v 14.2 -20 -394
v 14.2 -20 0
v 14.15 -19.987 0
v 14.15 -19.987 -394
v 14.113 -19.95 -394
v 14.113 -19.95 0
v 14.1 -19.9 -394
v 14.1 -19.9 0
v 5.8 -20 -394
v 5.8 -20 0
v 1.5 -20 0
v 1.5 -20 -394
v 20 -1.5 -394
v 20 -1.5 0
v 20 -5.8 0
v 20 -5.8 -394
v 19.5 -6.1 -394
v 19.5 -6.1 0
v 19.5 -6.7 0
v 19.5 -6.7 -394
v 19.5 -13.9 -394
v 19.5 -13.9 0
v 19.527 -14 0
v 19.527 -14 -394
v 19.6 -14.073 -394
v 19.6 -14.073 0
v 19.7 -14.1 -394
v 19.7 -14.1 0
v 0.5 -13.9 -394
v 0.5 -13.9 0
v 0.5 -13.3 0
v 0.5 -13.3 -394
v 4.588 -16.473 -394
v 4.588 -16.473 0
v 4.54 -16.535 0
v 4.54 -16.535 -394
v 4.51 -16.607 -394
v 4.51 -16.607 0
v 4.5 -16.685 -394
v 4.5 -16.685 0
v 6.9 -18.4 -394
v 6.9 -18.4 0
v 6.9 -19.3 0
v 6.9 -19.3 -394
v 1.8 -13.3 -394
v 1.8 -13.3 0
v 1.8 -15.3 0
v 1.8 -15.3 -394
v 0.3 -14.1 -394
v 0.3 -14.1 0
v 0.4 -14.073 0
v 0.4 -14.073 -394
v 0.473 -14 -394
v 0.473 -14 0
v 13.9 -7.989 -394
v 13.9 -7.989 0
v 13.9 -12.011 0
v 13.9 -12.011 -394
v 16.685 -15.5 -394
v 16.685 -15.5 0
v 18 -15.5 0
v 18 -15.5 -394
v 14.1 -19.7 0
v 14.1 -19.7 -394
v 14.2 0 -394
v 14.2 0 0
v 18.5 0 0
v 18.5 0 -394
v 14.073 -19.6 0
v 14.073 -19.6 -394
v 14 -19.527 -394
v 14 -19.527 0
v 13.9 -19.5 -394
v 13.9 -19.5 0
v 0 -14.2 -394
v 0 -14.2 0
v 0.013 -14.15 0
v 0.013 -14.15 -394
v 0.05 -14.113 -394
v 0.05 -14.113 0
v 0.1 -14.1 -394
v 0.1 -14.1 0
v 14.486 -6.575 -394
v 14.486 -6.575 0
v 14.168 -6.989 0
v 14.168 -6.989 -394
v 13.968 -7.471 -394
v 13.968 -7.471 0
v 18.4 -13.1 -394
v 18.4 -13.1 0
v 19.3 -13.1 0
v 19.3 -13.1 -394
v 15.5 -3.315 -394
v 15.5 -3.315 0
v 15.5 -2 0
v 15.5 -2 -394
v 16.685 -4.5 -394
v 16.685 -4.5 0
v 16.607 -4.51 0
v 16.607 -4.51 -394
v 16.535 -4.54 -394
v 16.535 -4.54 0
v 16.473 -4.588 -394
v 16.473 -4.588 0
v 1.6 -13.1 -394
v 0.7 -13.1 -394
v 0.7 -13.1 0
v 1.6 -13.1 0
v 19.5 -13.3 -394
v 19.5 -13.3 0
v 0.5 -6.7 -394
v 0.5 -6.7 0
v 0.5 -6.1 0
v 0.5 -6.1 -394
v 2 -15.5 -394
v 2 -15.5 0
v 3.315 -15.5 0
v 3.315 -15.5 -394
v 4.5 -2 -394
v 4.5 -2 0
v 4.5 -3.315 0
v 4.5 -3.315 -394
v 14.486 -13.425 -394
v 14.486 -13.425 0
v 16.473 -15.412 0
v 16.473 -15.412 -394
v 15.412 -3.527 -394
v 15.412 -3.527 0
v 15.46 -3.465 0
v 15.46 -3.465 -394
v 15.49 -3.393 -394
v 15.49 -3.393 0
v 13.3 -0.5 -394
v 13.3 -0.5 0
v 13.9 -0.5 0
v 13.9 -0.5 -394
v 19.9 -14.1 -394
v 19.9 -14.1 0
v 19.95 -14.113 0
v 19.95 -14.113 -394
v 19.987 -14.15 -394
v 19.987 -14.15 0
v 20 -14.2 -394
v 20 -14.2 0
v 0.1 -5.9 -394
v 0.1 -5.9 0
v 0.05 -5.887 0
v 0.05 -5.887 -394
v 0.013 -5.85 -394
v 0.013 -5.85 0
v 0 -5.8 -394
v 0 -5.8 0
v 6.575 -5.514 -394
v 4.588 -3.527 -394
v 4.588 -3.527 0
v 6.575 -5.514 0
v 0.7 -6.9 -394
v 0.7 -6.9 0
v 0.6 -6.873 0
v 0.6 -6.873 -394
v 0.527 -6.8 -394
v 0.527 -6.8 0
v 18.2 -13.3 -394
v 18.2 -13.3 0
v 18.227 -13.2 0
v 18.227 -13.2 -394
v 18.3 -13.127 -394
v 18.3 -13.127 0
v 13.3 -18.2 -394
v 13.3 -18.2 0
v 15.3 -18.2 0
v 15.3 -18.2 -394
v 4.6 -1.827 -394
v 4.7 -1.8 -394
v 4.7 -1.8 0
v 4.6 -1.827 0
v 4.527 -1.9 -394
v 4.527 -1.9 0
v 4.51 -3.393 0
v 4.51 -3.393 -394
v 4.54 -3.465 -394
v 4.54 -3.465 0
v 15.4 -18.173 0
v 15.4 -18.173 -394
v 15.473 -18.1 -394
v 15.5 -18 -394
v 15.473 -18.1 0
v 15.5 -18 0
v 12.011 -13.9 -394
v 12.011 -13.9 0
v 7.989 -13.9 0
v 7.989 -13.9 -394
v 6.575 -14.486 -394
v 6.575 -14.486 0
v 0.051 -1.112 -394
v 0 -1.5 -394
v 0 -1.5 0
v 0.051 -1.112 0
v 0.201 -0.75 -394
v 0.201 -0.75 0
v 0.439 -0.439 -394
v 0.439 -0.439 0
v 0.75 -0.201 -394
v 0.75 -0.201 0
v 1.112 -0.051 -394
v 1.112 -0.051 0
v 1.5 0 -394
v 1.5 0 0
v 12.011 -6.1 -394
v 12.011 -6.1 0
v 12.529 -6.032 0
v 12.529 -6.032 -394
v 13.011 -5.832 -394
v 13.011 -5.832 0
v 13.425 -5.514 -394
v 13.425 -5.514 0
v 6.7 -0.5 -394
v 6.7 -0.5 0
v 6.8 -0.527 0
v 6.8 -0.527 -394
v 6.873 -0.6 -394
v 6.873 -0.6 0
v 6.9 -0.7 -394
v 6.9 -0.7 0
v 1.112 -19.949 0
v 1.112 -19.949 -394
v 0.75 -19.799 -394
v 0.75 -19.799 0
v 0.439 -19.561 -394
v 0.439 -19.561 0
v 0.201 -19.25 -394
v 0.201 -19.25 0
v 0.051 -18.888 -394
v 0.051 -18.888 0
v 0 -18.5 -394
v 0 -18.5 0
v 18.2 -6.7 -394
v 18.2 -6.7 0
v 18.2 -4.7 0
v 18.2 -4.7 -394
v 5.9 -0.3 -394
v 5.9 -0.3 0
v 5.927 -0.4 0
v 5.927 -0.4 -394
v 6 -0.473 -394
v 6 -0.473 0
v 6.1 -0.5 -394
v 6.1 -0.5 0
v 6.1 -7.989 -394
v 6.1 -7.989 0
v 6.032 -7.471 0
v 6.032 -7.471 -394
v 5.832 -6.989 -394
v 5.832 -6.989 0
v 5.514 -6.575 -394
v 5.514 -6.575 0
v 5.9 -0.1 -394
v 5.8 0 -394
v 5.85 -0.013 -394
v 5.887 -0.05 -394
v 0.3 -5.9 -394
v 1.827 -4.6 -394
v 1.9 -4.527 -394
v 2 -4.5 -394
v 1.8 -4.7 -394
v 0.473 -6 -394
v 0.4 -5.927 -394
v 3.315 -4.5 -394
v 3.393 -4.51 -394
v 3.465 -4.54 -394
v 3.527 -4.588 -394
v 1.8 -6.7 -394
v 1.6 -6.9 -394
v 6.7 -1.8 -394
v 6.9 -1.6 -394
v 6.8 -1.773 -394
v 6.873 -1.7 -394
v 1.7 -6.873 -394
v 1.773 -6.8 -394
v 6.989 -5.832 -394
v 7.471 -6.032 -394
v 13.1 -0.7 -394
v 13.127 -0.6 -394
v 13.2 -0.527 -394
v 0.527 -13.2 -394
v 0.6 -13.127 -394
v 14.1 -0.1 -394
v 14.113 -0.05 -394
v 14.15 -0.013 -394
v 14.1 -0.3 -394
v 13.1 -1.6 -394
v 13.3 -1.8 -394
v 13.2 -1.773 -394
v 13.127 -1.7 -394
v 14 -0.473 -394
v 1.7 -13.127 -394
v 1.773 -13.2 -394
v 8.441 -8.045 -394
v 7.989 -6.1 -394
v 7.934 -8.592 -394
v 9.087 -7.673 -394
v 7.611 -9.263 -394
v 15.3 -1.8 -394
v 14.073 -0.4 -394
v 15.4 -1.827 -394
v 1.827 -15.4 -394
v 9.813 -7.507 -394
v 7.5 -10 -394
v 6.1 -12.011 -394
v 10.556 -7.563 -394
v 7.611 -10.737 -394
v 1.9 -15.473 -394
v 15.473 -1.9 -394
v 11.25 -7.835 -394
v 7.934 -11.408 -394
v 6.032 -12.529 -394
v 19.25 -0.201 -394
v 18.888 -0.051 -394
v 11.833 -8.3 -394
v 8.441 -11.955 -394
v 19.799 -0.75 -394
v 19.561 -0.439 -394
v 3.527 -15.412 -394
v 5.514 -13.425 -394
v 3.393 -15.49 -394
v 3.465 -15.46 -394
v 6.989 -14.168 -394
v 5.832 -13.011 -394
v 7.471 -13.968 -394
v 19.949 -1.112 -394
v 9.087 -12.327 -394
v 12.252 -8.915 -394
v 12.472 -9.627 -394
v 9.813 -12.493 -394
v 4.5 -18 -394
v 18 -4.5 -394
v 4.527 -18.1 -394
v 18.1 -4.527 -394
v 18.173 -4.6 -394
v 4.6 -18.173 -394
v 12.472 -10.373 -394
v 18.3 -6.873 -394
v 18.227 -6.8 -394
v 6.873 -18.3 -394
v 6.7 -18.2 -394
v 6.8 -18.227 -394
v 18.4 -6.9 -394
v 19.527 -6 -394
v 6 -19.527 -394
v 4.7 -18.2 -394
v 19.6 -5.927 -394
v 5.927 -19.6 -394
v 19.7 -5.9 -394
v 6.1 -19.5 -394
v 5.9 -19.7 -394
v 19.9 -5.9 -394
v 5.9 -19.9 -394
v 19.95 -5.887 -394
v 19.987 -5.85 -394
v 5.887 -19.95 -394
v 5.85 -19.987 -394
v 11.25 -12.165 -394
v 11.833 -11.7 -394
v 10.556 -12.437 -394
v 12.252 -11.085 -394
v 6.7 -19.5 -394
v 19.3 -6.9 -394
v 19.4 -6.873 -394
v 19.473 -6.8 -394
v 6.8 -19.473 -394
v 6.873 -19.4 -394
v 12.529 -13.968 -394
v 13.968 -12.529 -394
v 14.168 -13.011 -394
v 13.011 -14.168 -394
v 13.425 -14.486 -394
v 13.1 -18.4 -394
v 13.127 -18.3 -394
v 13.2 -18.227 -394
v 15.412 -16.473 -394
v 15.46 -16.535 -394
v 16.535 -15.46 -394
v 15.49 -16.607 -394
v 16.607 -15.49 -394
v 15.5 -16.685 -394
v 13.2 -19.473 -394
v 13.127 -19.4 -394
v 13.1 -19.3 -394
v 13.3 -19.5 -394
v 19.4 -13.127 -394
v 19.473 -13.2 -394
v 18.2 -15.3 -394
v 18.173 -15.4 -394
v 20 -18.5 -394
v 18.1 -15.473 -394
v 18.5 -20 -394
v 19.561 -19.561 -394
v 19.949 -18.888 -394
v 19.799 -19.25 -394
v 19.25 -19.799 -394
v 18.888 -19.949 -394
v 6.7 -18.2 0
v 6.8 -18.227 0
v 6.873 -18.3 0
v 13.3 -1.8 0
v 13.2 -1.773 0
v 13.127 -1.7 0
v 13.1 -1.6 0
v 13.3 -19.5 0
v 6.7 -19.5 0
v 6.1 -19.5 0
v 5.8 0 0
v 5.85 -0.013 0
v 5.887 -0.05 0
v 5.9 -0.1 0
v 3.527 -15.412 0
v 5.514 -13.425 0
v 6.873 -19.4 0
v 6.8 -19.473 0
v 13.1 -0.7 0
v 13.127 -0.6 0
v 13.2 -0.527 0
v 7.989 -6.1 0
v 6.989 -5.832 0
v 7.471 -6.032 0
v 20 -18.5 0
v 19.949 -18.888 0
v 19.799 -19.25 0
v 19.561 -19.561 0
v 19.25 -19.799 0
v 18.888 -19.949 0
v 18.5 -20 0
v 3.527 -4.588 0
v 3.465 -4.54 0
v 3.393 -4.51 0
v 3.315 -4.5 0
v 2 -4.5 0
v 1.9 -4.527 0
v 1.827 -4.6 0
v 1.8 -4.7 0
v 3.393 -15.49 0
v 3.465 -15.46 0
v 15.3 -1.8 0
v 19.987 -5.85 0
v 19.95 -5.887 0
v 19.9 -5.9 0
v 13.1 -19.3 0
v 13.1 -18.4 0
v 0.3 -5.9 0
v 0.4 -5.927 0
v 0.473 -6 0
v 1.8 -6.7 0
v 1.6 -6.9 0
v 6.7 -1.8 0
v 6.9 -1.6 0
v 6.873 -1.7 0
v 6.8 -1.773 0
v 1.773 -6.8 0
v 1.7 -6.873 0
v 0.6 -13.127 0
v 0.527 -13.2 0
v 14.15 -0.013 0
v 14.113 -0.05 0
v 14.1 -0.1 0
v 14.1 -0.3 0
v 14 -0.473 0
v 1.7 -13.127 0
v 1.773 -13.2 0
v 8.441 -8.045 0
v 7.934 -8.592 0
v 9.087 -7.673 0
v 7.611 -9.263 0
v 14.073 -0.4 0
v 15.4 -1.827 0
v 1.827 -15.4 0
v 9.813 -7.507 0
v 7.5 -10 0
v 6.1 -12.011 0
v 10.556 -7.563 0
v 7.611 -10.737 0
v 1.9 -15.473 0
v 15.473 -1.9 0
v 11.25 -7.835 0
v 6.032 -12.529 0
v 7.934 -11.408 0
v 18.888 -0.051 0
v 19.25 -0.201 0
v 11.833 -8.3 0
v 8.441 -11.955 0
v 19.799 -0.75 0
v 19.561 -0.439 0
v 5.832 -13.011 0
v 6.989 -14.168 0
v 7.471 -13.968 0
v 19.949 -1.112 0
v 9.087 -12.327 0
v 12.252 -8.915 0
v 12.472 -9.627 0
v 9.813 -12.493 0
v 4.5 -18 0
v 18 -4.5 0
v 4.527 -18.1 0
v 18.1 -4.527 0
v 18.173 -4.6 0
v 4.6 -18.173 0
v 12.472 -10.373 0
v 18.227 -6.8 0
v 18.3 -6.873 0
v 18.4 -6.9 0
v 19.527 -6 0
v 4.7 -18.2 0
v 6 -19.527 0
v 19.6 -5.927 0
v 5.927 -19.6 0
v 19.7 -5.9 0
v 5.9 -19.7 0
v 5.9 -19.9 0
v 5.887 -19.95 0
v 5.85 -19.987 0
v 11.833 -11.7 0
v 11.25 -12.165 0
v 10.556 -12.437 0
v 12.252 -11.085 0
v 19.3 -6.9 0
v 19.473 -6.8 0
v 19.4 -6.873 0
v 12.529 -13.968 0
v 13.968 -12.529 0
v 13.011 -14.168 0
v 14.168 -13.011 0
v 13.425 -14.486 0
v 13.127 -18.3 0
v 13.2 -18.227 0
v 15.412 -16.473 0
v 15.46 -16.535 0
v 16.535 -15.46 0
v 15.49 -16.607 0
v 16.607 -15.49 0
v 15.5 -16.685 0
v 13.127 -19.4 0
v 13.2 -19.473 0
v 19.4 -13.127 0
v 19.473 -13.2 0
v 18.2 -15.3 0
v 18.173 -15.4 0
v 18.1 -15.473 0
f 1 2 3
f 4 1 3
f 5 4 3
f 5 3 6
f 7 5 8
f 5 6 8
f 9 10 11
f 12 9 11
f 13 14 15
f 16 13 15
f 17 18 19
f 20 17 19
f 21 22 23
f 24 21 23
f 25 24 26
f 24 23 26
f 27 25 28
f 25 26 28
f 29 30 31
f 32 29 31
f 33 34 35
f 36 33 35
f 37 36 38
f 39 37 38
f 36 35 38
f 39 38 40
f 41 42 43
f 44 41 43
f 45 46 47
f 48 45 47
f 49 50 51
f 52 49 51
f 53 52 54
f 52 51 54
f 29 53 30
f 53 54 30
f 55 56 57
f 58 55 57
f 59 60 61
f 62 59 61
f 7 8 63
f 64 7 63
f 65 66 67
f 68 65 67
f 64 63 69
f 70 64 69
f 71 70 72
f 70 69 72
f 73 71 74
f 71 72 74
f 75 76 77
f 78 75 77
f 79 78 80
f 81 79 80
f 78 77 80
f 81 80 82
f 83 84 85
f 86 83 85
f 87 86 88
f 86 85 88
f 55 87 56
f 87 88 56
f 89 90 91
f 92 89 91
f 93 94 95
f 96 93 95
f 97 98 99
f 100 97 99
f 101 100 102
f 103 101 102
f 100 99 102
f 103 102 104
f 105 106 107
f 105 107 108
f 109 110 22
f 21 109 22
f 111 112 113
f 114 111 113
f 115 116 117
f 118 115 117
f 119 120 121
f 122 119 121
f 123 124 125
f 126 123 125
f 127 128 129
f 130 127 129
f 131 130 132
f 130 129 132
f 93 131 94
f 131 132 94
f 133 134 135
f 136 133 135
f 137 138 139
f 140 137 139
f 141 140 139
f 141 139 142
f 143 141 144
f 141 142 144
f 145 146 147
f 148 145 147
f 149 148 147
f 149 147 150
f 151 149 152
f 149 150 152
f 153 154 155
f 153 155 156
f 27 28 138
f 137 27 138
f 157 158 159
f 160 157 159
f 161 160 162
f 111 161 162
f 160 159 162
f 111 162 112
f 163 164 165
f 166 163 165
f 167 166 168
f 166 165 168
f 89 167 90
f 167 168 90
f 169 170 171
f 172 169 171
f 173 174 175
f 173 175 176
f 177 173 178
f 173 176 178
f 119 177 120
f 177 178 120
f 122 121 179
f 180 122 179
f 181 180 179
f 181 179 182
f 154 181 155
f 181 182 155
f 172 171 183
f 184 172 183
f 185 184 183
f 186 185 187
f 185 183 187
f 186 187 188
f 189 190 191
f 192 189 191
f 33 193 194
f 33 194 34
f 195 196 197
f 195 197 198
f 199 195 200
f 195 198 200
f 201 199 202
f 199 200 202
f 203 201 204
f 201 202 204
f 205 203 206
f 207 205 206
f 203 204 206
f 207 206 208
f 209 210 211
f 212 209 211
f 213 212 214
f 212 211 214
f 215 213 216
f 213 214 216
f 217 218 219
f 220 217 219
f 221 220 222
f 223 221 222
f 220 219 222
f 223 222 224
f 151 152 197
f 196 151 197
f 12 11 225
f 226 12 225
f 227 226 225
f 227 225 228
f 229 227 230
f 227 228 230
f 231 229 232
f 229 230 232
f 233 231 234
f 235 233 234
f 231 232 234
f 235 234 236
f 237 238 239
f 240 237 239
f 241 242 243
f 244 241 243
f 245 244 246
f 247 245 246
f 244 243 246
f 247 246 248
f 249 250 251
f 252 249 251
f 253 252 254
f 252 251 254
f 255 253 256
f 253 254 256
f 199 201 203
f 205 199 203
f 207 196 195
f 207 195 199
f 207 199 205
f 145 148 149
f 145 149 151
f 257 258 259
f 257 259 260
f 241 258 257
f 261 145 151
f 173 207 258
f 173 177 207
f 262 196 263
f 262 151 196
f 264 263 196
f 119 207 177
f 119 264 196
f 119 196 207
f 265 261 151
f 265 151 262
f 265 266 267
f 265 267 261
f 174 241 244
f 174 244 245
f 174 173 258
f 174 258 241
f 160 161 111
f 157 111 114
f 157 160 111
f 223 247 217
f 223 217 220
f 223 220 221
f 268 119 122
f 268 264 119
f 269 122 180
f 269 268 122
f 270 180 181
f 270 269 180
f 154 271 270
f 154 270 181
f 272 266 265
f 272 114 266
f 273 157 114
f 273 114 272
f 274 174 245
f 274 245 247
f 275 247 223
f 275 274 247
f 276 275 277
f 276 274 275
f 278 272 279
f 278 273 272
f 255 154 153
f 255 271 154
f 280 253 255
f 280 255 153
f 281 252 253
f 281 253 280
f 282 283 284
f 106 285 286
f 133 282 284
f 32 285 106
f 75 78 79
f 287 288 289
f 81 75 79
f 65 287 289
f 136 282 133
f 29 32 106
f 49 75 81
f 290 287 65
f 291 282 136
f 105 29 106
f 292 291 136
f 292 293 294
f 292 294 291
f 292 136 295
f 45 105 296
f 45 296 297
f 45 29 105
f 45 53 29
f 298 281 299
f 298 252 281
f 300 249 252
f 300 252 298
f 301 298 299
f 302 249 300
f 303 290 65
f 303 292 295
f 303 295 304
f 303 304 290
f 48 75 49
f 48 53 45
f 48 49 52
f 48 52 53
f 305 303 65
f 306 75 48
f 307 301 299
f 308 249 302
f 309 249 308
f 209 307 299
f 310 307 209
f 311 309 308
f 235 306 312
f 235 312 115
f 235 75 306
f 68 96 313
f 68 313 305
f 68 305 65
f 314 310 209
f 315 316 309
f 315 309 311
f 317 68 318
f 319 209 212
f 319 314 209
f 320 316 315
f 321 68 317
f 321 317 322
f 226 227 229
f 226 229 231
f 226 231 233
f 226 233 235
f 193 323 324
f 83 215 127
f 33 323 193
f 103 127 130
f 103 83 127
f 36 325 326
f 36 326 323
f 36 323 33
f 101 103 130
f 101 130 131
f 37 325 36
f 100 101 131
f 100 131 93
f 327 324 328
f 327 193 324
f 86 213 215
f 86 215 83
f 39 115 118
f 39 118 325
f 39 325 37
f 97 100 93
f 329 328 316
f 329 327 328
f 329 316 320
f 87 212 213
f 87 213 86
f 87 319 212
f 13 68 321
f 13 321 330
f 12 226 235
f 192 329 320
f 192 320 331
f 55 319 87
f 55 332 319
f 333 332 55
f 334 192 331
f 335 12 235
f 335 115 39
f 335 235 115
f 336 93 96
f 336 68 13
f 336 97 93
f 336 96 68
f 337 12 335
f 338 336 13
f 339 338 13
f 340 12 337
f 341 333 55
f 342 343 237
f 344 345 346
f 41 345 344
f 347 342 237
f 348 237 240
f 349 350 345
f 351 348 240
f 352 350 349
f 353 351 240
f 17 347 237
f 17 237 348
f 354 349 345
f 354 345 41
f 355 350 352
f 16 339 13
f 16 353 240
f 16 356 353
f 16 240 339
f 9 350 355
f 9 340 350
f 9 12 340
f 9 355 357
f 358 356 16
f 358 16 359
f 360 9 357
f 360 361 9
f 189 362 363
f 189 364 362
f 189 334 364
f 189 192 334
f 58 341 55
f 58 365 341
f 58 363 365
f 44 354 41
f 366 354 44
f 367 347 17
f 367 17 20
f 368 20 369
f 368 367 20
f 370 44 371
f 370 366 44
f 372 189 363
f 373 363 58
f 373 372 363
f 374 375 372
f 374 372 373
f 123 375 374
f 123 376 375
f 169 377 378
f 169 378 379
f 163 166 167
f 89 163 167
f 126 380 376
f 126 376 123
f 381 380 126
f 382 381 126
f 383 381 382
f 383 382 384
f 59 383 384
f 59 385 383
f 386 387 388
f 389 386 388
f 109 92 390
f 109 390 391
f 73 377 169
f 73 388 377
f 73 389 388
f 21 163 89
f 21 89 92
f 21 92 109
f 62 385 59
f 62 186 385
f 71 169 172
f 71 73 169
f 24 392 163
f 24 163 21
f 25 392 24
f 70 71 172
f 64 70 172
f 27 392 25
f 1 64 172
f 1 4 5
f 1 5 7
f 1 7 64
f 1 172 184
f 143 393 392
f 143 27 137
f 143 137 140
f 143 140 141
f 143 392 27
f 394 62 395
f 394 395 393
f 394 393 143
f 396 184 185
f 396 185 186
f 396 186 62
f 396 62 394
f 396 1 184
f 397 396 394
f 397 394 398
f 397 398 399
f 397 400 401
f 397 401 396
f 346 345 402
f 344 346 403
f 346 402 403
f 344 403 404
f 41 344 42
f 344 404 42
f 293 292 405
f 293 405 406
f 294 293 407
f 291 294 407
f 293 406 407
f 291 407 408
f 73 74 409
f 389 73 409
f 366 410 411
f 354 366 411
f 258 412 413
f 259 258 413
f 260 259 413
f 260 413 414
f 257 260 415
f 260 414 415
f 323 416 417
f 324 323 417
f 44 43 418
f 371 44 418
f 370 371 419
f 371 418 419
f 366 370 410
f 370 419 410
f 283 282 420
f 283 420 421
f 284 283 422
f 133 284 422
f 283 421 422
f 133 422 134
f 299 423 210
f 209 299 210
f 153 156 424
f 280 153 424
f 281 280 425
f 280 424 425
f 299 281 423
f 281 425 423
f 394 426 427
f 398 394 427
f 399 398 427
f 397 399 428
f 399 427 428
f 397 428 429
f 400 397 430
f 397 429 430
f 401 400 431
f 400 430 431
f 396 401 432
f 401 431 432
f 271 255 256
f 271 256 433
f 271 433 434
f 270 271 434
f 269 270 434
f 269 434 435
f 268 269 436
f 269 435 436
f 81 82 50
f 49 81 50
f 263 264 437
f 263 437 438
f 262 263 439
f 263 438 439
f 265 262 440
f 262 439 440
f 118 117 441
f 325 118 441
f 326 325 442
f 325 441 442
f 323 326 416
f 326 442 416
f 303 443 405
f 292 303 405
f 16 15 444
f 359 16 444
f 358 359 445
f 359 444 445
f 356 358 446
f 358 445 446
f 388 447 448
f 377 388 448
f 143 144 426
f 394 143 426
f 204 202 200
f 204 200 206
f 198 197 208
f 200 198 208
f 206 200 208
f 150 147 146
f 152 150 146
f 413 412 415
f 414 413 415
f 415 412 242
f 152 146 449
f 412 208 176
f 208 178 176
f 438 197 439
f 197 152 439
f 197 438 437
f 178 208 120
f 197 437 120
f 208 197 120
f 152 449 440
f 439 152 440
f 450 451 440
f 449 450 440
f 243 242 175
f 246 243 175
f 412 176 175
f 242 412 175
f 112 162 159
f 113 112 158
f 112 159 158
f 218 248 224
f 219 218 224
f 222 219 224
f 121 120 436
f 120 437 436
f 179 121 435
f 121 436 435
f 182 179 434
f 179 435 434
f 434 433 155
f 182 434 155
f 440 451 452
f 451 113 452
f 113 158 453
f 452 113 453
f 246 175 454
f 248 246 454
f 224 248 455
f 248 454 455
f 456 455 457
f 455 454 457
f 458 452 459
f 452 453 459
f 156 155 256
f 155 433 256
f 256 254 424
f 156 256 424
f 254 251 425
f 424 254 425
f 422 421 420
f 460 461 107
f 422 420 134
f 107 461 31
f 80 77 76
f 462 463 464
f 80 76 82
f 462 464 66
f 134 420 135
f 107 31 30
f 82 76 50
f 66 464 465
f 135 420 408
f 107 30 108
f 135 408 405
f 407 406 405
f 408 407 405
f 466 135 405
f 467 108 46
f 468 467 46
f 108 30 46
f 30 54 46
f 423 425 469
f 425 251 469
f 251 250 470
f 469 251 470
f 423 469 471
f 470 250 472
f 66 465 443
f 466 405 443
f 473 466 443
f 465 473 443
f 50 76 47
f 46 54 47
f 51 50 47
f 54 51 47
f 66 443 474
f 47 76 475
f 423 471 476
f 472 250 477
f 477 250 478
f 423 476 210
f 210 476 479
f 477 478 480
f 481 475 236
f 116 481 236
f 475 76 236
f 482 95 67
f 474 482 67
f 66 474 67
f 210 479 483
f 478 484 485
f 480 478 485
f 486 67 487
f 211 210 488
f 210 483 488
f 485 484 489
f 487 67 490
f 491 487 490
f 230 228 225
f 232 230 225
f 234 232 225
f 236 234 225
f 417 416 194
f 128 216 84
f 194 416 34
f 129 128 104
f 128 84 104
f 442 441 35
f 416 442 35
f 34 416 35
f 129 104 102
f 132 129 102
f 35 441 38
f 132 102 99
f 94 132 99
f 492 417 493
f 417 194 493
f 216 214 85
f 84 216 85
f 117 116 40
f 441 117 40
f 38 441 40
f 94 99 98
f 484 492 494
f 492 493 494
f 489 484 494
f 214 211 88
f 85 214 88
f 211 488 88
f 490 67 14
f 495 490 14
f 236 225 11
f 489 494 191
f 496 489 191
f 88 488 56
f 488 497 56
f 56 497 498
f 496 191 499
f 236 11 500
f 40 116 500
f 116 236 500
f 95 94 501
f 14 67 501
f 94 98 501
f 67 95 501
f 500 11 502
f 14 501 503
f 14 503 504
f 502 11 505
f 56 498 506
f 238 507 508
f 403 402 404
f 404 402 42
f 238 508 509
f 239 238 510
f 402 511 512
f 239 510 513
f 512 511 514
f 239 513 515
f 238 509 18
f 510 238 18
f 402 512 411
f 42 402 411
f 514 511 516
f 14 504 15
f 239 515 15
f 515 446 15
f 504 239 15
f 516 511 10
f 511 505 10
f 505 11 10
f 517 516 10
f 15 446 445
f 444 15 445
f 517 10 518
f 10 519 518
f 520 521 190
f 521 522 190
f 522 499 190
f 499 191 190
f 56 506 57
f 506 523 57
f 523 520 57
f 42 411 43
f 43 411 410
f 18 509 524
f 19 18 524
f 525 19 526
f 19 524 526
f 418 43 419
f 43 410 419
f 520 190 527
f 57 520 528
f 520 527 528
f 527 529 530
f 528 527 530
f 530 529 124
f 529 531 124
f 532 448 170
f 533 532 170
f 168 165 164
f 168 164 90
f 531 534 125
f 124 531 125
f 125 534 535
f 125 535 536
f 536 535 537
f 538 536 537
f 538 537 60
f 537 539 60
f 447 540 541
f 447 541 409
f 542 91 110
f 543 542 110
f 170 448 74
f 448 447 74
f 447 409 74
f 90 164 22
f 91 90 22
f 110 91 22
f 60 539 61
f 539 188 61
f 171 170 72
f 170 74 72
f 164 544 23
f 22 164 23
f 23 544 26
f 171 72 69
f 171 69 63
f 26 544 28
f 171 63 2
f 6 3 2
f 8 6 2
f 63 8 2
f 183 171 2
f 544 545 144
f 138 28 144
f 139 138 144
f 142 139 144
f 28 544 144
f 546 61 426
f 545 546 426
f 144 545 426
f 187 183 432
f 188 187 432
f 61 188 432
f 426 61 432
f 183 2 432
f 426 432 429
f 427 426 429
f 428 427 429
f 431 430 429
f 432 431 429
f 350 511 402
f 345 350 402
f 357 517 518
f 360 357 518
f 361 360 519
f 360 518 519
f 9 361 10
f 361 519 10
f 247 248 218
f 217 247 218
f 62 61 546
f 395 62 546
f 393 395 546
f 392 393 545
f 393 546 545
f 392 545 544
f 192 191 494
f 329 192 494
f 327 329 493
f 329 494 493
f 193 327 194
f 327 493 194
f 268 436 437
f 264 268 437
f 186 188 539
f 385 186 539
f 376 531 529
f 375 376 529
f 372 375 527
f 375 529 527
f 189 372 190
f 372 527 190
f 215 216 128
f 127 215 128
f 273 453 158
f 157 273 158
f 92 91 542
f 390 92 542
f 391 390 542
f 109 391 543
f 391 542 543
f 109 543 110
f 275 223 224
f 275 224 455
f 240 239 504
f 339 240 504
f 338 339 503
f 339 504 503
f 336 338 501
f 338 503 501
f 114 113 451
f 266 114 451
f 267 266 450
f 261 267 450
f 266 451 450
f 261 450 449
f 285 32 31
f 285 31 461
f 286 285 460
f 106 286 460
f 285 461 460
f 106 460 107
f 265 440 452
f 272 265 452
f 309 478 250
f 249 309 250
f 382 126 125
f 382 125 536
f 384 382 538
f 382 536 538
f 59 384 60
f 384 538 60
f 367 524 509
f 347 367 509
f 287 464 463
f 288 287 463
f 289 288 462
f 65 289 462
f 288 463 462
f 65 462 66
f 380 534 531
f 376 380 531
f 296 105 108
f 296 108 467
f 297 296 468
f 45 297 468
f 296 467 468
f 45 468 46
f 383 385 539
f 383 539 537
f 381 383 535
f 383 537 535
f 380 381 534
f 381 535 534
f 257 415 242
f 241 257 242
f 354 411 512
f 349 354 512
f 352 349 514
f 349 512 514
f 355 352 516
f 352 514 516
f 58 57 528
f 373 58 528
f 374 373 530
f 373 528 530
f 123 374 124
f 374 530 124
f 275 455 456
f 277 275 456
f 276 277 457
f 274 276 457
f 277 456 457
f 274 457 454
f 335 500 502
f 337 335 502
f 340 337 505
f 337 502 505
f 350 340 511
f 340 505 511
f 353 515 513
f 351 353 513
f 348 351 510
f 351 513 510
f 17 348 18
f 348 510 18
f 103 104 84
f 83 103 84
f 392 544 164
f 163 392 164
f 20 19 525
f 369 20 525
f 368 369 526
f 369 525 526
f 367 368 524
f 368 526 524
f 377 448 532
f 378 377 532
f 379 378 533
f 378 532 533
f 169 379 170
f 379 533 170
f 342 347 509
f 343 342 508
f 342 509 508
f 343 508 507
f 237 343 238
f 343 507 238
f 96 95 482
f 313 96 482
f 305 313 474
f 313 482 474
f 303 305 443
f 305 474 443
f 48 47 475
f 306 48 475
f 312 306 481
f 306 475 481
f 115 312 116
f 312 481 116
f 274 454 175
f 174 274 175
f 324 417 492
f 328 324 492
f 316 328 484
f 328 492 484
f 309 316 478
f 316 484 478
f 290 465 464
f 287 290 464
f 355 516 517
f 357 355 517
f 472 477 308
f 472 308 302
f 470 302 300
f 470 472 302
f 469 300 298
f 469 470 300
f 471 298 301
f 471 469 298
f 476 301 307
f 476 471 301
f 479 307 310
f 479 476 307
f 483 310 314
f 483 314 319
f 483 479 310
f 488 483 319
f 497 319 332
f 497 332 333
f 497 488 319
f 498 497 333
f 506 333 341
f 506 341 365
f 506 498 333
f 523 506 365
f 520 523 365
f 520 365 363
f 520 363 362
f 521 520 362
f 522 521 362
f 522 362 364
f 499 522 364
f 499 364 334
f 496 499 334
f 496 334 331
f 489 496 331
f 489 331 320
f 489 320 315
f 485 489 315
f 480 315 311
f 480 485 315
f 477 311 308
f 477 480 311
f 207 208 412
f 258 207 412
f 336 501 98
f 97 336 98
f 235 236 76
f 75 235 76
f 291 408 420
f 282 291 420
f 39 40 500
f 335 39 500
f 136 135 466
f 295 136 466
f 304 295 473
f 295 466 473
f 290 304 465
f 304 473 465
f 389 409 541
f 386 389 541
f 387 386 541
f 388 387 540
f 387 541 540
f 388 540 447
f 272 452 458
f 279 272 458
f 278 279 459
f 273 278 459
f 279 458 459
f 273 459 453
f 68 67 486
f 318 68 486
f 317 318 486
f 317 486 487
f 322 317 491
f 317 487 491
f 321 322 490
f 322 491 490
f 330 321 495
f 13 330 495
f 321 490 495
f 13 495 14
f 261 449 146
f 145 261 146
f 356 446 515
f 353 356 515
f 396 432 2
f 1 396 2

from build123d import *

# Parameters (mm, degrees)
SKETCH1_R           = 2.5
BOSS_EXTRUDE1_DEPTH = 394


with BuildPart() as part:
    # Sketch1 → Boss-Extrude1 (new body)
    with BuildSketch(Plane(origin=(0, 0, 0), x_dir=(1, 0, 0), z_dir=(0, 0, -1))):
        with BuildLine():
            Line((1.5, 0), (5.8, 0))
            ThreePointArc((5.8, 0), (5.870710678, 0.029289322), (5.9, 0.1))
            Line((5.9, 0.1), (5.9, 0.3))
            ThreePointArc((5.9, 0.3), (5.958578644, 0.441421356), (6.1, 0.5))
            Line((6.1, 0.5), (6.7, 0.5))
            ThreePointArc((6.7, 0.5), (6.841421356, 0.558578644), (6.9, 0.7))
            Line((6.9, 0.7), (6.9, 1.6))
            ThreePointArc((6.9, 1.6), (6.841421356, 1.741421356), (6.7, 1.8))
            Line((6.7, 1.8), (4.7, 1.8))
            ThreePointArc((4.7, 1.8), (4.558578644, 1.858578644), (4.5, 2))
            Line((4.5, 2), (4.5, 3.31507576))
            ThreePointArc((4.5, 3.31507576), (4.52283614, 3.429880789), (4.587867966, 3.527207794))
            Line((4.587867966, 3.527207794), (6.574873734, 5.514213562))
            ThreePointArc((6.574873734, 5.514213562), (7.223720432, 5.947759065), (7.989087297, 6.1))
            Line((7.989087297, 6.1), (12.010912703, 6.1))
            ThreePointArc((12.010912703, 6.1), (12.776279568, 5.947759065), (13.425126266, 5.514213562))
            Line((13.425126266, 5.514213562), (15.412132034, 3.527207794))
            ThreePointArc((15.412132034, 3.527207794), (15.47716386, 3.429880789), (15.5, 3.31507576))
            Line((15.5, 3.31507576), (15.5, 2))
            ThreePointArc((15.5, 2), (15.441421356, 1.858578644), (15.3, 1.8))
            Line((15.3, 1.8), (13.3, 1.8))
            ThreePointArc((13.3, 1.8), (13.158578644, 1.741421356), (13.1, 1.6))
            Line((13.1, 1.6), (13.1, 0.7))
            ThreePointArc((13.1, 0.7), (13.158578644, 0.558578644), (13.3, 0.5))
            Line((13.3, 0.5), (13.9, 0.5))
            ThreePointArc((13.9, 0.5), (14.041421356, 0.441421356), (14.1, 0.3))
            Line((14.1, 0.3), (14.1, 0.1))
            ThreePointArc((14.1, 0.1), (14.129289322, 0.029289322), (14.2, 0))
            Line((14.2, 0), (18.5, 0))
            ThreePointArc((18.5, 0), (19.560660172, 0.439339828), (20, 1.5))
            Line((20, 1.5), (20, 5.8))
            ThreePointArc((20, 5.8), (19.970710678, 5.870710678), (19.9, 5.9))
            Line((19.9, 5.9), (19.7, 5.9))
            ThreePointArc((19.7, 5.9), (19.558578644, 5.958578644), (19.5, 6.1))
            Line((19.5, 6.1), (19.5, 6.7))
            ThreePointArc((19.5, 6.7), (19.441421356, 6.841421356), (19.3, 6.9))
            Line((19.3, 6.9), (18.4, 6.9))
            ThreePointArc((18.4, 6.9), (18.258578644, 6.841421356), (18.2, 6.7))
            Line((18.2, 6.7), (18.2, 4.7))
            ThreePointArc((18.2, 4.7), (18.141421356, 4.558578644), (18, 4.5))
            Line((18, 4.5), (16.68492424, 4.5))
            ThreePointArc((16.68492424, 4.5), (16.570119211, 4.52283614), (16.472792206, 4.587867966))
            Line((16.472792206, 4.587867966), (14.485786438, 6.574873734))
            ThreePointArc((14.485786438, 6.574873734), (14.052240935, 7.223720432), (13.9, 7.989087297))
            Line((13.9, 7.989087297), (13.9, 12.010912703))
            ThreePointArc((13.9, 12.010912703), (14.052240935, 12.776279568), (14.485786438, 13.425126266))
            Line((14.485786438, 13.425126266), (16.472792206, 15.412132034))
            ThreePointArc((16.472792206, 15.412132034), (16.570119211, 15.47716386), (16.68492424, 15.5))
            Line((16.68492424, 15.5), (18, 15.5))
            ThreePointArc((18, 15.5), (18.141421356, 15.441421356), (18.2, 15.3))
            Line((18.2, 15.3), (18.2, 13.3))
            ThreePointArc((18.2, 13.3), (18.258578644, 13.158578644), (18.4, 13.1))
            Line((18.4, 13.1), (19.3, 13.1))
            ThreePointArc((19.3, 13.1), (19.441421356, 13.158578644), (19.5, 13.3))
            Line((19.5, 13.3), (19.5, 13.9))
            ThreePointArc((19.5, 13.9), (19.558578644, 14.041421356), (19.7, 14.1))
            Line((19.7, 14.1), (19.9, 14.1))
            ThreePointArc((19.9, 14.1), (19.970710678, 14.129289322), (20, 14.2))
            Line((20, 14.2), (20, 18.5))
            ThreePointArc((20, 18.5), (19.560660172, 19.560660172), (18.5, 20))
            Line((18.5, 20), (14.2, 20))
            ThreePointArc((14.2, 20), (14.129289322, 19.970710678), (14.1, 19.9))
            Line((14.1, 19.9), (14.1, 19.7))
            ThreePointArc((14.1, 19.7), (14.041421356, 19.558578644), (13.9, 19.5))
            Line((13.9, 19.5), (13.3, 19.5))
            ThreePointArc((13.3, 19.5), (13.158578644, 19.441421356), (13.1, 19.3))
            Line((13.1, 19.3), (13.1, 18.4))
            ThreePointArc((13.1, 18.4), (13.158578644, 18.258578644), (13.3, 18.2))
            Line((13.3, 18.2), (15.3, 18.2))
            ThreePointArc((15.3, 18.2), (15.441421356, 18.141421356), (15.5, 18))
            Line((15.5, 18), (15.5, 16.68492424))
            ThreePointArc((15.5, 16.68492424), (15.47716386, 16.570119211), (15.412132034, 16.472792206))
            Line((15.412132034, 16.472792206), (13.425126266, 14.485786438))
            ThreePointArc((13.425126266, 14.485786438), (12.776279568, 14.052240935), (12.010912703, 13.9))
            Line((12.010912703, 13.9), (7.989087297, 13.9))
            ThreePointArc((7.989087297, 13.9), (7.223720432, 14.052240935), (6.574873734, 14.485786438))
            Line((6.574873734, 14.485786438), (4.587867966, 16.472792206))
            ThreePointArc((4.587867966, 16.472792206), (4.52283614, 16.570119211), (4.5, 16.68492424))
            Line((4.5, 16.68492424), (4.5, 18))
            ThreePointArc((4.5, 18), (4.558578644, 18.141421356), (4.7, 18.2))
            Line((4.7, 18.2), (6.7, 18.2))
            ThreePointArc((6.7, 18.2), (6.841421356, 18.258578644), (6.9, 18.4))
            Line((6.9, 18.4), (6.9, 19.3))
            ThreePointArc((6.9, 19.3), (6.841421356, 19.441421356), (6.7, 19.5))
            Line((6.7, 19.5), (6.1, 19.5))
            ThreePointArc((6.1, 19.5), (5.958578644, 19.558578644), (5.9, 19.7))
            Line((5.9, 19.7), (5.9, 19.9))
            ThreePointArc((5.9, 19.9), (5.870710678, 19.970710678), (5.8, 20))
            Line((5.8, 20), (1.5, 20))
            ThreePointArc((1.5, 20), (0.439339828, 19.560660172), (0, 18.5))
            Line((0, 18.5), (0, 14.2))
            ThreePointArc((0, 14.2), (0.029289322, 14.129289322), (0.1, 14.1))
            Line((0.1, 14.1), (0.3, 14.1))
            ThreePointArc((0.3, 14.1), (0.441421356, 14.041421356), (0.5, 13.9))
            Line((0.5, 13.9), (0.5, 13.3))
            ThreePointArc((0.5, 13.3), (0.558578644, 13.158578644), (0.7, 13.1))
            Line((0.7, 13.1), (1.6, 13.1))
            ThreePointArc((1.6, 13.1), (1.741421356, 13.158578644), (1.8, 13.3))
            Line((1.8, 13.3), (1.8, 15.3))
            ThreePointArc((1.8, 15.3), (1.858578644, 15.441421356), (2, 15.5))
            Line((2, 15.5), (3.31507576, 15.5))
            ThreePointArc((3.31507576, 15.5), (3.429880789, 15.47716386), (3.527207794, 15.412132034))
            Line((3.527207794, 15.412132034), (5.514213562, 13.425126266))
            ThreePointArc((5.514213562, 13.425126266), (5.947759065, 12.776279568), (6.1, 12.010912703))
            Line((6.1, 12.010912703), (6.1, 7.989087297))
            ThreePointArc((6.1, 7.989087297), (5.947759065, 7.223720432), (5.514213562, 6.574873734))
            Line((5.514213562, 6.574873734), (3.527207794, 4.587867966))
            ThreePointArc((3.527207794, 4.587867966), (3.429880789, 4.52283614), (3.31507576, 4.5))
            Line((3.31507576, 4.5), (2, 4.5))
            ThreePointArc((2, 4.5), (1.858578644, 4.558578644), (1.8, 4.7))
            Line((1.8, 4.7), (1.8, 6.7))
            ThreePointArc((1.8, 6.7), (1.741421356, 6.841421356), (1.6, 6.9))
            Line((1.6, 6.9), (0.7, 6.9))
            ThreePointArc((0.7, 6.9), (0.558578644, 6.841421356), (0.5, 6.7))
            Line((0.5, 6.7), (0.5, 6.1))
            ThreePointArc((0.5, 6.1), (0.441421356, 5.958578644), (0.3, 5.9))
            Line((0.3, 5.9), (0.1, 5.9))
            ThreePointArc((0.1, 5.9), (0.029289322, 5.870710678), (0, 5.8))
            Line((0, 5.8), (0, 1.5))
            ThreePointArc((0, 1.5), (0.439339828, 0.439339828), (1.5, 0))
        make_face()
        with Locations(Location((10, 10, 0), (0, 0, 180))):
            Circle(SKETCH1_R, mode=Mode.SUBTRACT)
    extrude(amount=BOSS_EXTRUDE1_DEPTH)


solid = part.part
